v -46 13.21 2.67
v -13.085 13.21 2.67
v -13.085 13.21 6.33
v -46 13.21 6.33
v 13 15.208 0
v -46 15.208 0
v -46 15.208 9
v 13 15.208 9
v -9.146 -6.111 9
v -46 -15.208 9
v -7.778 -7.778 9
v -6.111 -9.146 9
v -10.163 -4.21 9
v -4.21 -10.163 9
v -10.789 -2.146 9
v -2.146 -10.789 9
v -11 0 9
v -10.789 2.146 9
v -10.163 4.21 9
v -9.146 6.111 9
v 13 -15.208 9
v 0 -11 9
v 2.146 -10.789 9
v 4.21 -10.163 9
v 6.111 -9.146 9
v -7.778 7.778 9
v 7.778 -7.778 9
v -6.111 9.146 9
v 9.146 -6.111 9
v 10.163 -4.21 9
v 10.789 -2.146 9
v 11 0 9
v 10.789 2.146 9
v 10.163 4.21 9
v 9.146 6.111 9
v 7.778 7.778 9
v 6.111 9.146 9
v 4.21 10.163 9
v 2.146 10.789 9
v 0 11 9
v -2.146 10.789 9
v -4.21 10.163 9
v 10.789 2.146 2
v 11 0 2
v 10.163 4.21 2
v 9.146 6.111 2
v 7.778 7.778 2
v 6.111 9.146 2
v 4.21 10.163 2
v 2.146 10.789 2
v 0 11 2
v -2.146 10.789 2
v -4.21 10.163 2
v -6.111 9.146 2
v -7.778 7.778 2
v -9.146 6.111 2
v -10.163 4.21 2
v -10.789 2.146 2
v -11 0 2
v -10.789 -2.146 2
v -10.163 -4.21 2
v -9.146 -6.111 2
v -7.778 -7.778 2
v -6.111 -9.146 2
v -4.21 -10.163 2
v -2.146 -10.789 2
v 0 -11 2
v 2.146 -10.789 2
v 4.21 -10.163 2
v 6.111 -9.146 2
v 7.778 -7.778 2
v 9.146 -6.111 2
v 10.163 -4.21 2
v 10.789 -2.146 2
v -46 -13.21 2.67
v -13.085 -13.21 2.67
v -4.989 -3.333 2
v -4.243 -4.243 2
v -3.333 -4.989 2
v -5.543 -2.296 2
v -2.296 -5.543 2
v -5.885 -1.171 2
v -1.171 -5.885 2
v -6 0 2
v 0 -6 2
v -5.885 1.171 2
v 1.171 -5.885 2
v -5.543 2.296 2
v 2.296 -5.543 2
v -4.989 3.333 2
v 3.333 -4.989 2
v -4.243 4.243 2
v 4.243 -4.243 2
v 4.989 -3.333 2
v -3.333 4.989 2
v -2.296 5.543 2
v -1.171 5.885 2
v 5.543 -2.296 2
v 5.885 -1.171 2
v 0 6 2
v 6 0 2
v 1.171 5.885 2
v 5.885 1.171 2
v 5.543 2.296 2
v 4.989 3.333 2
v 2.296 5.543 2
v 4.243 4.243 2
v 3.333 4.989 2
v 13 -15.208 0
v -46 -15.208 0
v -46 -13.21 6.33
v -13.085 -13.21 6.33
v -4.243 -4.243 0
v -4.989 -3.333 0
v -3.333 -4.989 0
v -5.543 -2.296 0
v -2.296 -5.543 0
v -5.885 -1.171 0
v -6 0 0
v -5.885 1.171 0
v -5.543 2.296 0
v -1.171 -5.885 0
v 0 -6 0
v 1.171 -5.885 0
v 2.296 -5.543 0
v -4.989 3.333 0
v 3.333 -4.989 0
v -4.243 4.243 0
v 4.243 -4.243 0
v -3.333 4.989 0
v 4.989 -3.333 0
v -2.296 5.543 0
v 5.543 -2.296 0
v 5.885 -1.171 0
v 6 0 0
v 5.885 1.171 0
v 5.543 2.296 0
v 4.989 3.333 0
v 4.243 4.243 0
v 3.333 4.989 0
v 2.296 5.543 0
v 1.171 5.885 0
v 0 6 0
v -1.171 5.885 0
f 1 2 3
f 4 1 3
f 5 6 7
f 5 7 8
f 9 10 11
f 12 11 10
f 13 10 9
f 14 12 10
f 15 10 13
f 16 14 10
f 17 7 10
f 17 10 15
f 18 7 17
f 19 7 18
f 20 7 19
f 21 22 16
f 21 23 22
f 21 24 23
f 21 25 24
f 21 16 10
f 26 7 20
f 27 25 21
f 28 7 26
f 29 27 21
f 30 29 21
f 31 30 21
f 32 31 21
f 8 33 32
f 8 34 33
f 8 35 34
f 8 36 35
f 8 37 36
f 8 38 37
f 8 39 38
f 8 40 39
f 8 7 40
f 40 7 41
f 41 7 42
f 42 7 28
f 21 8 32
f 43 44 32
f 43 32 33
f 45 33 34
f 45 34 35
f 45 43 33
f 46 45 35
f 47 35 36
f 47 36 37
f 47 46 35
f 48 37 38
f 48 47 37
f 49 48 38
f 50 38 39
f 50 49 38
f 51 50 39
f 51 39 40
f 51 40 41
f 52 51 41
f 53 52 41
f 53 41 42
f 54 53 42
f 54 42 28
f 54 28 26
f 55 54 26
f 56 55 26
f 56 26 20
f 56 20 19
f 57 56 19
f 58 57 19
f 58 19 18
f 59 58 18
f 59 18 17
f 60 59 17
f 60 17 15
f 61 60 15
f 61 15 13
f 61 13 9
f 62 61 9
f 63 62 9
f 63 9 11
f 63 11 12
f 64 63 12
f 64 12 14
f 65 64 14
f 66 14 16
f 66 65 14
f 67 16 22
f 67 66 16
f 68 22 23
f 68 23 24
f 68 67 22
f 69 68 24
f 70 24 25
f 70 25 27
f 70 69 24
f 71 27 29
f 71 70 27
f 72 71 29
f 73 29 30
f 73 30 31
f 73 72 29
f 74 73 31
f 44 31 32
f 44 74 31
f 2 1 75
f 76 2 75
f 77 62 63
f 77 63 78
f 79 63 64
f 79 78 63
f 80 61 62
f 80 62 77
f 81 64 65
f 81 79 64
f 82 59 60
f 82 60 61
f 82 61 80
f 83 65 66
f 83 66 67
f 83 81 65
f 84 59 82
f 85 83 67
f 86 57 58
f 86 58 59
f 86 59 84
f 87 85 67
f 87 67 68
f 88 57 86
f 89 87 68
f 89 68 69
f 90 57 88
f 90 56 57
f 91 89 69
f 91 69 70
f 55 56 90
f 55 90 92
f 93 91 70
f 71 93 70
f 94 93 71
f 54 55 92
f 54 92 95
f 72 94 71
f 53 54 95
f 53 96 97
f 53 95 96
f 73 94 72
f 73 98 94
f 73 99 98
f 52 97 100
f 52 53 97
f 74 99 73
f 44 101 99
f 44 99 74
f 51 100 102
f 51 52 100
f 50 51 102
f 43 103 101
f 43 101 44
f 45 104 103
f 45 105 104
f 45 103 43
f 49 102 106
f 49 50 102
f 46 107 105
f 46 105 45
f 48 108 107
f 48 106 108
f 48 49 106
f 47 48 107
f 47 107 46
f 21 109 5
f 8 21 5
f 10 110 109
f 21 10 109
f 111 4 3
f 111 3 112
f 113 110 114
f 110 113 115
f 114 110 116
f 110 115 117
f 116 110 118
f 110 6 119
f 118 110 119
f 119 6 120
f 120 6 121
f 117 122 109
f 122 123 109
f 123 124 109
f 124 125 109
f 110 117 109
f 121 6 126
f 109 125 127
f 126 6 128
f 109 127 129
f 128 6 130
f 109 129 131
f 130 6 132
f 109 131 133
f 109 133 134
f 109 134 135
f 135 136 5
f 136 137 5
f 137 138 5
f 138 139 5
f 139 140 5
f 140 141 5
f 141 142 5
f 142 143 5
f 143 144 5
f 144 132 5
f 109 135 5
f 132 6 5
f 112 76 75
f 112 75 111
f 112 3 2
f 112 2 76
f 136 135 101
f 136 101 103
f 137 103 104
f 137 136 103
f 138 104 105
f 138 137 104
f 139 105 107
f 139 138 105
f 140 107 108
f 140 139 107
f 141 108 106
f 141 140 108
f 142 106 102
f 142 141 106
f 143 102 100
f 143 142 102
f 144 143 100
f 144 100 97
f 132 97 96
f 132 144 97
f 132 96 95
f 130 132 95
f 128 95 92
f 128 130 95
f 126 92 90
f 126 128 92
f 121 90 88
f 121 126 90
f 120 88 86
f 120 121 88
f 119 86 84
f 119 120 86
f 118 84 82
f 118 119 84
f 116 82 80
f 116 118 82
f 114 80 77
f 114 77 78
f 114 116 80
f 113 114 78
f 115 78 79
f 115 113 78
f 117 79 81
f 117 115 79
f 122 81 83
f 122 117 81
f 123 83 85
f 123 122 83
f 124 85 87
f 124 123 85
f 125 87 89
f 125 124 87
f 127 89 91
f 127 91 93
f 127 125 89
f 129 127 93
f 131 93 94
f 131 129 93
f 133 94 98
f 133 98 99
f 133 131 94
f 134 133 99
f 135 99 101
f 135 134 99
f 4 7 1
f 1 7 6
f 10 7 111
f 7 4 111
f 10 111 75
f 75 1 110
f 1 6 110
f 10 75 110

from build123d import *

# Parameters (mm, degrees)
F0_R     = 13
F0_R_2   = 11
F0_W     = 59
F0_H     = 2
F1_DEPTH = 9
F0_R_3   = 6
F2_DEPTH = 2
F3_W     = 26.42
F3_H     = 3.66
F4_DEPTH = 32.91456


with BuildPart() as f1:
    # F0 (on Top) → F1 (new body)
    with BuildSketch(Plane.XY):
        Polygon((13, -13.208), (13, 0), (13, 13.208), (-46, 13.208), (-46, -13.208), align=None)
        Circle(F0_R, mode=Mode.SUBTRACT)
        Circle(F0_R)
        Circle(F0_R_2, mode=Mode.SUBTRACT)
        with Locations((-16.5, 14.208)):
            Rectangle(F0_W, F0_H)
        with Locations((-16.5, -14.208)):
            Rectangle(F0_W, F0_H)
    extrude(amount=F1_DEPTH)

    # F0 (on Top) → F2 (join)
    with BuildSketch(Plane.XY):
        Circle(F0_R_2)
        Circle(F0_R_3, mode=Mode.SUBTRACT)
    extrude(amount=F2_DEPTH)

    # F3 (on face) → F4 (cut)
    with BuildSketch(Plane(origin=(-46, 0, 0), x_dir=(0, -1, 0), z_dir=(-1, 0, 0))):
        with Locations((0, 4.5)):
            Rectangle(F3_W, F3_H)
    extrude(amount=-F4_DEPTH, mode=Mode.SUBTRACT)


solid = f1.part
